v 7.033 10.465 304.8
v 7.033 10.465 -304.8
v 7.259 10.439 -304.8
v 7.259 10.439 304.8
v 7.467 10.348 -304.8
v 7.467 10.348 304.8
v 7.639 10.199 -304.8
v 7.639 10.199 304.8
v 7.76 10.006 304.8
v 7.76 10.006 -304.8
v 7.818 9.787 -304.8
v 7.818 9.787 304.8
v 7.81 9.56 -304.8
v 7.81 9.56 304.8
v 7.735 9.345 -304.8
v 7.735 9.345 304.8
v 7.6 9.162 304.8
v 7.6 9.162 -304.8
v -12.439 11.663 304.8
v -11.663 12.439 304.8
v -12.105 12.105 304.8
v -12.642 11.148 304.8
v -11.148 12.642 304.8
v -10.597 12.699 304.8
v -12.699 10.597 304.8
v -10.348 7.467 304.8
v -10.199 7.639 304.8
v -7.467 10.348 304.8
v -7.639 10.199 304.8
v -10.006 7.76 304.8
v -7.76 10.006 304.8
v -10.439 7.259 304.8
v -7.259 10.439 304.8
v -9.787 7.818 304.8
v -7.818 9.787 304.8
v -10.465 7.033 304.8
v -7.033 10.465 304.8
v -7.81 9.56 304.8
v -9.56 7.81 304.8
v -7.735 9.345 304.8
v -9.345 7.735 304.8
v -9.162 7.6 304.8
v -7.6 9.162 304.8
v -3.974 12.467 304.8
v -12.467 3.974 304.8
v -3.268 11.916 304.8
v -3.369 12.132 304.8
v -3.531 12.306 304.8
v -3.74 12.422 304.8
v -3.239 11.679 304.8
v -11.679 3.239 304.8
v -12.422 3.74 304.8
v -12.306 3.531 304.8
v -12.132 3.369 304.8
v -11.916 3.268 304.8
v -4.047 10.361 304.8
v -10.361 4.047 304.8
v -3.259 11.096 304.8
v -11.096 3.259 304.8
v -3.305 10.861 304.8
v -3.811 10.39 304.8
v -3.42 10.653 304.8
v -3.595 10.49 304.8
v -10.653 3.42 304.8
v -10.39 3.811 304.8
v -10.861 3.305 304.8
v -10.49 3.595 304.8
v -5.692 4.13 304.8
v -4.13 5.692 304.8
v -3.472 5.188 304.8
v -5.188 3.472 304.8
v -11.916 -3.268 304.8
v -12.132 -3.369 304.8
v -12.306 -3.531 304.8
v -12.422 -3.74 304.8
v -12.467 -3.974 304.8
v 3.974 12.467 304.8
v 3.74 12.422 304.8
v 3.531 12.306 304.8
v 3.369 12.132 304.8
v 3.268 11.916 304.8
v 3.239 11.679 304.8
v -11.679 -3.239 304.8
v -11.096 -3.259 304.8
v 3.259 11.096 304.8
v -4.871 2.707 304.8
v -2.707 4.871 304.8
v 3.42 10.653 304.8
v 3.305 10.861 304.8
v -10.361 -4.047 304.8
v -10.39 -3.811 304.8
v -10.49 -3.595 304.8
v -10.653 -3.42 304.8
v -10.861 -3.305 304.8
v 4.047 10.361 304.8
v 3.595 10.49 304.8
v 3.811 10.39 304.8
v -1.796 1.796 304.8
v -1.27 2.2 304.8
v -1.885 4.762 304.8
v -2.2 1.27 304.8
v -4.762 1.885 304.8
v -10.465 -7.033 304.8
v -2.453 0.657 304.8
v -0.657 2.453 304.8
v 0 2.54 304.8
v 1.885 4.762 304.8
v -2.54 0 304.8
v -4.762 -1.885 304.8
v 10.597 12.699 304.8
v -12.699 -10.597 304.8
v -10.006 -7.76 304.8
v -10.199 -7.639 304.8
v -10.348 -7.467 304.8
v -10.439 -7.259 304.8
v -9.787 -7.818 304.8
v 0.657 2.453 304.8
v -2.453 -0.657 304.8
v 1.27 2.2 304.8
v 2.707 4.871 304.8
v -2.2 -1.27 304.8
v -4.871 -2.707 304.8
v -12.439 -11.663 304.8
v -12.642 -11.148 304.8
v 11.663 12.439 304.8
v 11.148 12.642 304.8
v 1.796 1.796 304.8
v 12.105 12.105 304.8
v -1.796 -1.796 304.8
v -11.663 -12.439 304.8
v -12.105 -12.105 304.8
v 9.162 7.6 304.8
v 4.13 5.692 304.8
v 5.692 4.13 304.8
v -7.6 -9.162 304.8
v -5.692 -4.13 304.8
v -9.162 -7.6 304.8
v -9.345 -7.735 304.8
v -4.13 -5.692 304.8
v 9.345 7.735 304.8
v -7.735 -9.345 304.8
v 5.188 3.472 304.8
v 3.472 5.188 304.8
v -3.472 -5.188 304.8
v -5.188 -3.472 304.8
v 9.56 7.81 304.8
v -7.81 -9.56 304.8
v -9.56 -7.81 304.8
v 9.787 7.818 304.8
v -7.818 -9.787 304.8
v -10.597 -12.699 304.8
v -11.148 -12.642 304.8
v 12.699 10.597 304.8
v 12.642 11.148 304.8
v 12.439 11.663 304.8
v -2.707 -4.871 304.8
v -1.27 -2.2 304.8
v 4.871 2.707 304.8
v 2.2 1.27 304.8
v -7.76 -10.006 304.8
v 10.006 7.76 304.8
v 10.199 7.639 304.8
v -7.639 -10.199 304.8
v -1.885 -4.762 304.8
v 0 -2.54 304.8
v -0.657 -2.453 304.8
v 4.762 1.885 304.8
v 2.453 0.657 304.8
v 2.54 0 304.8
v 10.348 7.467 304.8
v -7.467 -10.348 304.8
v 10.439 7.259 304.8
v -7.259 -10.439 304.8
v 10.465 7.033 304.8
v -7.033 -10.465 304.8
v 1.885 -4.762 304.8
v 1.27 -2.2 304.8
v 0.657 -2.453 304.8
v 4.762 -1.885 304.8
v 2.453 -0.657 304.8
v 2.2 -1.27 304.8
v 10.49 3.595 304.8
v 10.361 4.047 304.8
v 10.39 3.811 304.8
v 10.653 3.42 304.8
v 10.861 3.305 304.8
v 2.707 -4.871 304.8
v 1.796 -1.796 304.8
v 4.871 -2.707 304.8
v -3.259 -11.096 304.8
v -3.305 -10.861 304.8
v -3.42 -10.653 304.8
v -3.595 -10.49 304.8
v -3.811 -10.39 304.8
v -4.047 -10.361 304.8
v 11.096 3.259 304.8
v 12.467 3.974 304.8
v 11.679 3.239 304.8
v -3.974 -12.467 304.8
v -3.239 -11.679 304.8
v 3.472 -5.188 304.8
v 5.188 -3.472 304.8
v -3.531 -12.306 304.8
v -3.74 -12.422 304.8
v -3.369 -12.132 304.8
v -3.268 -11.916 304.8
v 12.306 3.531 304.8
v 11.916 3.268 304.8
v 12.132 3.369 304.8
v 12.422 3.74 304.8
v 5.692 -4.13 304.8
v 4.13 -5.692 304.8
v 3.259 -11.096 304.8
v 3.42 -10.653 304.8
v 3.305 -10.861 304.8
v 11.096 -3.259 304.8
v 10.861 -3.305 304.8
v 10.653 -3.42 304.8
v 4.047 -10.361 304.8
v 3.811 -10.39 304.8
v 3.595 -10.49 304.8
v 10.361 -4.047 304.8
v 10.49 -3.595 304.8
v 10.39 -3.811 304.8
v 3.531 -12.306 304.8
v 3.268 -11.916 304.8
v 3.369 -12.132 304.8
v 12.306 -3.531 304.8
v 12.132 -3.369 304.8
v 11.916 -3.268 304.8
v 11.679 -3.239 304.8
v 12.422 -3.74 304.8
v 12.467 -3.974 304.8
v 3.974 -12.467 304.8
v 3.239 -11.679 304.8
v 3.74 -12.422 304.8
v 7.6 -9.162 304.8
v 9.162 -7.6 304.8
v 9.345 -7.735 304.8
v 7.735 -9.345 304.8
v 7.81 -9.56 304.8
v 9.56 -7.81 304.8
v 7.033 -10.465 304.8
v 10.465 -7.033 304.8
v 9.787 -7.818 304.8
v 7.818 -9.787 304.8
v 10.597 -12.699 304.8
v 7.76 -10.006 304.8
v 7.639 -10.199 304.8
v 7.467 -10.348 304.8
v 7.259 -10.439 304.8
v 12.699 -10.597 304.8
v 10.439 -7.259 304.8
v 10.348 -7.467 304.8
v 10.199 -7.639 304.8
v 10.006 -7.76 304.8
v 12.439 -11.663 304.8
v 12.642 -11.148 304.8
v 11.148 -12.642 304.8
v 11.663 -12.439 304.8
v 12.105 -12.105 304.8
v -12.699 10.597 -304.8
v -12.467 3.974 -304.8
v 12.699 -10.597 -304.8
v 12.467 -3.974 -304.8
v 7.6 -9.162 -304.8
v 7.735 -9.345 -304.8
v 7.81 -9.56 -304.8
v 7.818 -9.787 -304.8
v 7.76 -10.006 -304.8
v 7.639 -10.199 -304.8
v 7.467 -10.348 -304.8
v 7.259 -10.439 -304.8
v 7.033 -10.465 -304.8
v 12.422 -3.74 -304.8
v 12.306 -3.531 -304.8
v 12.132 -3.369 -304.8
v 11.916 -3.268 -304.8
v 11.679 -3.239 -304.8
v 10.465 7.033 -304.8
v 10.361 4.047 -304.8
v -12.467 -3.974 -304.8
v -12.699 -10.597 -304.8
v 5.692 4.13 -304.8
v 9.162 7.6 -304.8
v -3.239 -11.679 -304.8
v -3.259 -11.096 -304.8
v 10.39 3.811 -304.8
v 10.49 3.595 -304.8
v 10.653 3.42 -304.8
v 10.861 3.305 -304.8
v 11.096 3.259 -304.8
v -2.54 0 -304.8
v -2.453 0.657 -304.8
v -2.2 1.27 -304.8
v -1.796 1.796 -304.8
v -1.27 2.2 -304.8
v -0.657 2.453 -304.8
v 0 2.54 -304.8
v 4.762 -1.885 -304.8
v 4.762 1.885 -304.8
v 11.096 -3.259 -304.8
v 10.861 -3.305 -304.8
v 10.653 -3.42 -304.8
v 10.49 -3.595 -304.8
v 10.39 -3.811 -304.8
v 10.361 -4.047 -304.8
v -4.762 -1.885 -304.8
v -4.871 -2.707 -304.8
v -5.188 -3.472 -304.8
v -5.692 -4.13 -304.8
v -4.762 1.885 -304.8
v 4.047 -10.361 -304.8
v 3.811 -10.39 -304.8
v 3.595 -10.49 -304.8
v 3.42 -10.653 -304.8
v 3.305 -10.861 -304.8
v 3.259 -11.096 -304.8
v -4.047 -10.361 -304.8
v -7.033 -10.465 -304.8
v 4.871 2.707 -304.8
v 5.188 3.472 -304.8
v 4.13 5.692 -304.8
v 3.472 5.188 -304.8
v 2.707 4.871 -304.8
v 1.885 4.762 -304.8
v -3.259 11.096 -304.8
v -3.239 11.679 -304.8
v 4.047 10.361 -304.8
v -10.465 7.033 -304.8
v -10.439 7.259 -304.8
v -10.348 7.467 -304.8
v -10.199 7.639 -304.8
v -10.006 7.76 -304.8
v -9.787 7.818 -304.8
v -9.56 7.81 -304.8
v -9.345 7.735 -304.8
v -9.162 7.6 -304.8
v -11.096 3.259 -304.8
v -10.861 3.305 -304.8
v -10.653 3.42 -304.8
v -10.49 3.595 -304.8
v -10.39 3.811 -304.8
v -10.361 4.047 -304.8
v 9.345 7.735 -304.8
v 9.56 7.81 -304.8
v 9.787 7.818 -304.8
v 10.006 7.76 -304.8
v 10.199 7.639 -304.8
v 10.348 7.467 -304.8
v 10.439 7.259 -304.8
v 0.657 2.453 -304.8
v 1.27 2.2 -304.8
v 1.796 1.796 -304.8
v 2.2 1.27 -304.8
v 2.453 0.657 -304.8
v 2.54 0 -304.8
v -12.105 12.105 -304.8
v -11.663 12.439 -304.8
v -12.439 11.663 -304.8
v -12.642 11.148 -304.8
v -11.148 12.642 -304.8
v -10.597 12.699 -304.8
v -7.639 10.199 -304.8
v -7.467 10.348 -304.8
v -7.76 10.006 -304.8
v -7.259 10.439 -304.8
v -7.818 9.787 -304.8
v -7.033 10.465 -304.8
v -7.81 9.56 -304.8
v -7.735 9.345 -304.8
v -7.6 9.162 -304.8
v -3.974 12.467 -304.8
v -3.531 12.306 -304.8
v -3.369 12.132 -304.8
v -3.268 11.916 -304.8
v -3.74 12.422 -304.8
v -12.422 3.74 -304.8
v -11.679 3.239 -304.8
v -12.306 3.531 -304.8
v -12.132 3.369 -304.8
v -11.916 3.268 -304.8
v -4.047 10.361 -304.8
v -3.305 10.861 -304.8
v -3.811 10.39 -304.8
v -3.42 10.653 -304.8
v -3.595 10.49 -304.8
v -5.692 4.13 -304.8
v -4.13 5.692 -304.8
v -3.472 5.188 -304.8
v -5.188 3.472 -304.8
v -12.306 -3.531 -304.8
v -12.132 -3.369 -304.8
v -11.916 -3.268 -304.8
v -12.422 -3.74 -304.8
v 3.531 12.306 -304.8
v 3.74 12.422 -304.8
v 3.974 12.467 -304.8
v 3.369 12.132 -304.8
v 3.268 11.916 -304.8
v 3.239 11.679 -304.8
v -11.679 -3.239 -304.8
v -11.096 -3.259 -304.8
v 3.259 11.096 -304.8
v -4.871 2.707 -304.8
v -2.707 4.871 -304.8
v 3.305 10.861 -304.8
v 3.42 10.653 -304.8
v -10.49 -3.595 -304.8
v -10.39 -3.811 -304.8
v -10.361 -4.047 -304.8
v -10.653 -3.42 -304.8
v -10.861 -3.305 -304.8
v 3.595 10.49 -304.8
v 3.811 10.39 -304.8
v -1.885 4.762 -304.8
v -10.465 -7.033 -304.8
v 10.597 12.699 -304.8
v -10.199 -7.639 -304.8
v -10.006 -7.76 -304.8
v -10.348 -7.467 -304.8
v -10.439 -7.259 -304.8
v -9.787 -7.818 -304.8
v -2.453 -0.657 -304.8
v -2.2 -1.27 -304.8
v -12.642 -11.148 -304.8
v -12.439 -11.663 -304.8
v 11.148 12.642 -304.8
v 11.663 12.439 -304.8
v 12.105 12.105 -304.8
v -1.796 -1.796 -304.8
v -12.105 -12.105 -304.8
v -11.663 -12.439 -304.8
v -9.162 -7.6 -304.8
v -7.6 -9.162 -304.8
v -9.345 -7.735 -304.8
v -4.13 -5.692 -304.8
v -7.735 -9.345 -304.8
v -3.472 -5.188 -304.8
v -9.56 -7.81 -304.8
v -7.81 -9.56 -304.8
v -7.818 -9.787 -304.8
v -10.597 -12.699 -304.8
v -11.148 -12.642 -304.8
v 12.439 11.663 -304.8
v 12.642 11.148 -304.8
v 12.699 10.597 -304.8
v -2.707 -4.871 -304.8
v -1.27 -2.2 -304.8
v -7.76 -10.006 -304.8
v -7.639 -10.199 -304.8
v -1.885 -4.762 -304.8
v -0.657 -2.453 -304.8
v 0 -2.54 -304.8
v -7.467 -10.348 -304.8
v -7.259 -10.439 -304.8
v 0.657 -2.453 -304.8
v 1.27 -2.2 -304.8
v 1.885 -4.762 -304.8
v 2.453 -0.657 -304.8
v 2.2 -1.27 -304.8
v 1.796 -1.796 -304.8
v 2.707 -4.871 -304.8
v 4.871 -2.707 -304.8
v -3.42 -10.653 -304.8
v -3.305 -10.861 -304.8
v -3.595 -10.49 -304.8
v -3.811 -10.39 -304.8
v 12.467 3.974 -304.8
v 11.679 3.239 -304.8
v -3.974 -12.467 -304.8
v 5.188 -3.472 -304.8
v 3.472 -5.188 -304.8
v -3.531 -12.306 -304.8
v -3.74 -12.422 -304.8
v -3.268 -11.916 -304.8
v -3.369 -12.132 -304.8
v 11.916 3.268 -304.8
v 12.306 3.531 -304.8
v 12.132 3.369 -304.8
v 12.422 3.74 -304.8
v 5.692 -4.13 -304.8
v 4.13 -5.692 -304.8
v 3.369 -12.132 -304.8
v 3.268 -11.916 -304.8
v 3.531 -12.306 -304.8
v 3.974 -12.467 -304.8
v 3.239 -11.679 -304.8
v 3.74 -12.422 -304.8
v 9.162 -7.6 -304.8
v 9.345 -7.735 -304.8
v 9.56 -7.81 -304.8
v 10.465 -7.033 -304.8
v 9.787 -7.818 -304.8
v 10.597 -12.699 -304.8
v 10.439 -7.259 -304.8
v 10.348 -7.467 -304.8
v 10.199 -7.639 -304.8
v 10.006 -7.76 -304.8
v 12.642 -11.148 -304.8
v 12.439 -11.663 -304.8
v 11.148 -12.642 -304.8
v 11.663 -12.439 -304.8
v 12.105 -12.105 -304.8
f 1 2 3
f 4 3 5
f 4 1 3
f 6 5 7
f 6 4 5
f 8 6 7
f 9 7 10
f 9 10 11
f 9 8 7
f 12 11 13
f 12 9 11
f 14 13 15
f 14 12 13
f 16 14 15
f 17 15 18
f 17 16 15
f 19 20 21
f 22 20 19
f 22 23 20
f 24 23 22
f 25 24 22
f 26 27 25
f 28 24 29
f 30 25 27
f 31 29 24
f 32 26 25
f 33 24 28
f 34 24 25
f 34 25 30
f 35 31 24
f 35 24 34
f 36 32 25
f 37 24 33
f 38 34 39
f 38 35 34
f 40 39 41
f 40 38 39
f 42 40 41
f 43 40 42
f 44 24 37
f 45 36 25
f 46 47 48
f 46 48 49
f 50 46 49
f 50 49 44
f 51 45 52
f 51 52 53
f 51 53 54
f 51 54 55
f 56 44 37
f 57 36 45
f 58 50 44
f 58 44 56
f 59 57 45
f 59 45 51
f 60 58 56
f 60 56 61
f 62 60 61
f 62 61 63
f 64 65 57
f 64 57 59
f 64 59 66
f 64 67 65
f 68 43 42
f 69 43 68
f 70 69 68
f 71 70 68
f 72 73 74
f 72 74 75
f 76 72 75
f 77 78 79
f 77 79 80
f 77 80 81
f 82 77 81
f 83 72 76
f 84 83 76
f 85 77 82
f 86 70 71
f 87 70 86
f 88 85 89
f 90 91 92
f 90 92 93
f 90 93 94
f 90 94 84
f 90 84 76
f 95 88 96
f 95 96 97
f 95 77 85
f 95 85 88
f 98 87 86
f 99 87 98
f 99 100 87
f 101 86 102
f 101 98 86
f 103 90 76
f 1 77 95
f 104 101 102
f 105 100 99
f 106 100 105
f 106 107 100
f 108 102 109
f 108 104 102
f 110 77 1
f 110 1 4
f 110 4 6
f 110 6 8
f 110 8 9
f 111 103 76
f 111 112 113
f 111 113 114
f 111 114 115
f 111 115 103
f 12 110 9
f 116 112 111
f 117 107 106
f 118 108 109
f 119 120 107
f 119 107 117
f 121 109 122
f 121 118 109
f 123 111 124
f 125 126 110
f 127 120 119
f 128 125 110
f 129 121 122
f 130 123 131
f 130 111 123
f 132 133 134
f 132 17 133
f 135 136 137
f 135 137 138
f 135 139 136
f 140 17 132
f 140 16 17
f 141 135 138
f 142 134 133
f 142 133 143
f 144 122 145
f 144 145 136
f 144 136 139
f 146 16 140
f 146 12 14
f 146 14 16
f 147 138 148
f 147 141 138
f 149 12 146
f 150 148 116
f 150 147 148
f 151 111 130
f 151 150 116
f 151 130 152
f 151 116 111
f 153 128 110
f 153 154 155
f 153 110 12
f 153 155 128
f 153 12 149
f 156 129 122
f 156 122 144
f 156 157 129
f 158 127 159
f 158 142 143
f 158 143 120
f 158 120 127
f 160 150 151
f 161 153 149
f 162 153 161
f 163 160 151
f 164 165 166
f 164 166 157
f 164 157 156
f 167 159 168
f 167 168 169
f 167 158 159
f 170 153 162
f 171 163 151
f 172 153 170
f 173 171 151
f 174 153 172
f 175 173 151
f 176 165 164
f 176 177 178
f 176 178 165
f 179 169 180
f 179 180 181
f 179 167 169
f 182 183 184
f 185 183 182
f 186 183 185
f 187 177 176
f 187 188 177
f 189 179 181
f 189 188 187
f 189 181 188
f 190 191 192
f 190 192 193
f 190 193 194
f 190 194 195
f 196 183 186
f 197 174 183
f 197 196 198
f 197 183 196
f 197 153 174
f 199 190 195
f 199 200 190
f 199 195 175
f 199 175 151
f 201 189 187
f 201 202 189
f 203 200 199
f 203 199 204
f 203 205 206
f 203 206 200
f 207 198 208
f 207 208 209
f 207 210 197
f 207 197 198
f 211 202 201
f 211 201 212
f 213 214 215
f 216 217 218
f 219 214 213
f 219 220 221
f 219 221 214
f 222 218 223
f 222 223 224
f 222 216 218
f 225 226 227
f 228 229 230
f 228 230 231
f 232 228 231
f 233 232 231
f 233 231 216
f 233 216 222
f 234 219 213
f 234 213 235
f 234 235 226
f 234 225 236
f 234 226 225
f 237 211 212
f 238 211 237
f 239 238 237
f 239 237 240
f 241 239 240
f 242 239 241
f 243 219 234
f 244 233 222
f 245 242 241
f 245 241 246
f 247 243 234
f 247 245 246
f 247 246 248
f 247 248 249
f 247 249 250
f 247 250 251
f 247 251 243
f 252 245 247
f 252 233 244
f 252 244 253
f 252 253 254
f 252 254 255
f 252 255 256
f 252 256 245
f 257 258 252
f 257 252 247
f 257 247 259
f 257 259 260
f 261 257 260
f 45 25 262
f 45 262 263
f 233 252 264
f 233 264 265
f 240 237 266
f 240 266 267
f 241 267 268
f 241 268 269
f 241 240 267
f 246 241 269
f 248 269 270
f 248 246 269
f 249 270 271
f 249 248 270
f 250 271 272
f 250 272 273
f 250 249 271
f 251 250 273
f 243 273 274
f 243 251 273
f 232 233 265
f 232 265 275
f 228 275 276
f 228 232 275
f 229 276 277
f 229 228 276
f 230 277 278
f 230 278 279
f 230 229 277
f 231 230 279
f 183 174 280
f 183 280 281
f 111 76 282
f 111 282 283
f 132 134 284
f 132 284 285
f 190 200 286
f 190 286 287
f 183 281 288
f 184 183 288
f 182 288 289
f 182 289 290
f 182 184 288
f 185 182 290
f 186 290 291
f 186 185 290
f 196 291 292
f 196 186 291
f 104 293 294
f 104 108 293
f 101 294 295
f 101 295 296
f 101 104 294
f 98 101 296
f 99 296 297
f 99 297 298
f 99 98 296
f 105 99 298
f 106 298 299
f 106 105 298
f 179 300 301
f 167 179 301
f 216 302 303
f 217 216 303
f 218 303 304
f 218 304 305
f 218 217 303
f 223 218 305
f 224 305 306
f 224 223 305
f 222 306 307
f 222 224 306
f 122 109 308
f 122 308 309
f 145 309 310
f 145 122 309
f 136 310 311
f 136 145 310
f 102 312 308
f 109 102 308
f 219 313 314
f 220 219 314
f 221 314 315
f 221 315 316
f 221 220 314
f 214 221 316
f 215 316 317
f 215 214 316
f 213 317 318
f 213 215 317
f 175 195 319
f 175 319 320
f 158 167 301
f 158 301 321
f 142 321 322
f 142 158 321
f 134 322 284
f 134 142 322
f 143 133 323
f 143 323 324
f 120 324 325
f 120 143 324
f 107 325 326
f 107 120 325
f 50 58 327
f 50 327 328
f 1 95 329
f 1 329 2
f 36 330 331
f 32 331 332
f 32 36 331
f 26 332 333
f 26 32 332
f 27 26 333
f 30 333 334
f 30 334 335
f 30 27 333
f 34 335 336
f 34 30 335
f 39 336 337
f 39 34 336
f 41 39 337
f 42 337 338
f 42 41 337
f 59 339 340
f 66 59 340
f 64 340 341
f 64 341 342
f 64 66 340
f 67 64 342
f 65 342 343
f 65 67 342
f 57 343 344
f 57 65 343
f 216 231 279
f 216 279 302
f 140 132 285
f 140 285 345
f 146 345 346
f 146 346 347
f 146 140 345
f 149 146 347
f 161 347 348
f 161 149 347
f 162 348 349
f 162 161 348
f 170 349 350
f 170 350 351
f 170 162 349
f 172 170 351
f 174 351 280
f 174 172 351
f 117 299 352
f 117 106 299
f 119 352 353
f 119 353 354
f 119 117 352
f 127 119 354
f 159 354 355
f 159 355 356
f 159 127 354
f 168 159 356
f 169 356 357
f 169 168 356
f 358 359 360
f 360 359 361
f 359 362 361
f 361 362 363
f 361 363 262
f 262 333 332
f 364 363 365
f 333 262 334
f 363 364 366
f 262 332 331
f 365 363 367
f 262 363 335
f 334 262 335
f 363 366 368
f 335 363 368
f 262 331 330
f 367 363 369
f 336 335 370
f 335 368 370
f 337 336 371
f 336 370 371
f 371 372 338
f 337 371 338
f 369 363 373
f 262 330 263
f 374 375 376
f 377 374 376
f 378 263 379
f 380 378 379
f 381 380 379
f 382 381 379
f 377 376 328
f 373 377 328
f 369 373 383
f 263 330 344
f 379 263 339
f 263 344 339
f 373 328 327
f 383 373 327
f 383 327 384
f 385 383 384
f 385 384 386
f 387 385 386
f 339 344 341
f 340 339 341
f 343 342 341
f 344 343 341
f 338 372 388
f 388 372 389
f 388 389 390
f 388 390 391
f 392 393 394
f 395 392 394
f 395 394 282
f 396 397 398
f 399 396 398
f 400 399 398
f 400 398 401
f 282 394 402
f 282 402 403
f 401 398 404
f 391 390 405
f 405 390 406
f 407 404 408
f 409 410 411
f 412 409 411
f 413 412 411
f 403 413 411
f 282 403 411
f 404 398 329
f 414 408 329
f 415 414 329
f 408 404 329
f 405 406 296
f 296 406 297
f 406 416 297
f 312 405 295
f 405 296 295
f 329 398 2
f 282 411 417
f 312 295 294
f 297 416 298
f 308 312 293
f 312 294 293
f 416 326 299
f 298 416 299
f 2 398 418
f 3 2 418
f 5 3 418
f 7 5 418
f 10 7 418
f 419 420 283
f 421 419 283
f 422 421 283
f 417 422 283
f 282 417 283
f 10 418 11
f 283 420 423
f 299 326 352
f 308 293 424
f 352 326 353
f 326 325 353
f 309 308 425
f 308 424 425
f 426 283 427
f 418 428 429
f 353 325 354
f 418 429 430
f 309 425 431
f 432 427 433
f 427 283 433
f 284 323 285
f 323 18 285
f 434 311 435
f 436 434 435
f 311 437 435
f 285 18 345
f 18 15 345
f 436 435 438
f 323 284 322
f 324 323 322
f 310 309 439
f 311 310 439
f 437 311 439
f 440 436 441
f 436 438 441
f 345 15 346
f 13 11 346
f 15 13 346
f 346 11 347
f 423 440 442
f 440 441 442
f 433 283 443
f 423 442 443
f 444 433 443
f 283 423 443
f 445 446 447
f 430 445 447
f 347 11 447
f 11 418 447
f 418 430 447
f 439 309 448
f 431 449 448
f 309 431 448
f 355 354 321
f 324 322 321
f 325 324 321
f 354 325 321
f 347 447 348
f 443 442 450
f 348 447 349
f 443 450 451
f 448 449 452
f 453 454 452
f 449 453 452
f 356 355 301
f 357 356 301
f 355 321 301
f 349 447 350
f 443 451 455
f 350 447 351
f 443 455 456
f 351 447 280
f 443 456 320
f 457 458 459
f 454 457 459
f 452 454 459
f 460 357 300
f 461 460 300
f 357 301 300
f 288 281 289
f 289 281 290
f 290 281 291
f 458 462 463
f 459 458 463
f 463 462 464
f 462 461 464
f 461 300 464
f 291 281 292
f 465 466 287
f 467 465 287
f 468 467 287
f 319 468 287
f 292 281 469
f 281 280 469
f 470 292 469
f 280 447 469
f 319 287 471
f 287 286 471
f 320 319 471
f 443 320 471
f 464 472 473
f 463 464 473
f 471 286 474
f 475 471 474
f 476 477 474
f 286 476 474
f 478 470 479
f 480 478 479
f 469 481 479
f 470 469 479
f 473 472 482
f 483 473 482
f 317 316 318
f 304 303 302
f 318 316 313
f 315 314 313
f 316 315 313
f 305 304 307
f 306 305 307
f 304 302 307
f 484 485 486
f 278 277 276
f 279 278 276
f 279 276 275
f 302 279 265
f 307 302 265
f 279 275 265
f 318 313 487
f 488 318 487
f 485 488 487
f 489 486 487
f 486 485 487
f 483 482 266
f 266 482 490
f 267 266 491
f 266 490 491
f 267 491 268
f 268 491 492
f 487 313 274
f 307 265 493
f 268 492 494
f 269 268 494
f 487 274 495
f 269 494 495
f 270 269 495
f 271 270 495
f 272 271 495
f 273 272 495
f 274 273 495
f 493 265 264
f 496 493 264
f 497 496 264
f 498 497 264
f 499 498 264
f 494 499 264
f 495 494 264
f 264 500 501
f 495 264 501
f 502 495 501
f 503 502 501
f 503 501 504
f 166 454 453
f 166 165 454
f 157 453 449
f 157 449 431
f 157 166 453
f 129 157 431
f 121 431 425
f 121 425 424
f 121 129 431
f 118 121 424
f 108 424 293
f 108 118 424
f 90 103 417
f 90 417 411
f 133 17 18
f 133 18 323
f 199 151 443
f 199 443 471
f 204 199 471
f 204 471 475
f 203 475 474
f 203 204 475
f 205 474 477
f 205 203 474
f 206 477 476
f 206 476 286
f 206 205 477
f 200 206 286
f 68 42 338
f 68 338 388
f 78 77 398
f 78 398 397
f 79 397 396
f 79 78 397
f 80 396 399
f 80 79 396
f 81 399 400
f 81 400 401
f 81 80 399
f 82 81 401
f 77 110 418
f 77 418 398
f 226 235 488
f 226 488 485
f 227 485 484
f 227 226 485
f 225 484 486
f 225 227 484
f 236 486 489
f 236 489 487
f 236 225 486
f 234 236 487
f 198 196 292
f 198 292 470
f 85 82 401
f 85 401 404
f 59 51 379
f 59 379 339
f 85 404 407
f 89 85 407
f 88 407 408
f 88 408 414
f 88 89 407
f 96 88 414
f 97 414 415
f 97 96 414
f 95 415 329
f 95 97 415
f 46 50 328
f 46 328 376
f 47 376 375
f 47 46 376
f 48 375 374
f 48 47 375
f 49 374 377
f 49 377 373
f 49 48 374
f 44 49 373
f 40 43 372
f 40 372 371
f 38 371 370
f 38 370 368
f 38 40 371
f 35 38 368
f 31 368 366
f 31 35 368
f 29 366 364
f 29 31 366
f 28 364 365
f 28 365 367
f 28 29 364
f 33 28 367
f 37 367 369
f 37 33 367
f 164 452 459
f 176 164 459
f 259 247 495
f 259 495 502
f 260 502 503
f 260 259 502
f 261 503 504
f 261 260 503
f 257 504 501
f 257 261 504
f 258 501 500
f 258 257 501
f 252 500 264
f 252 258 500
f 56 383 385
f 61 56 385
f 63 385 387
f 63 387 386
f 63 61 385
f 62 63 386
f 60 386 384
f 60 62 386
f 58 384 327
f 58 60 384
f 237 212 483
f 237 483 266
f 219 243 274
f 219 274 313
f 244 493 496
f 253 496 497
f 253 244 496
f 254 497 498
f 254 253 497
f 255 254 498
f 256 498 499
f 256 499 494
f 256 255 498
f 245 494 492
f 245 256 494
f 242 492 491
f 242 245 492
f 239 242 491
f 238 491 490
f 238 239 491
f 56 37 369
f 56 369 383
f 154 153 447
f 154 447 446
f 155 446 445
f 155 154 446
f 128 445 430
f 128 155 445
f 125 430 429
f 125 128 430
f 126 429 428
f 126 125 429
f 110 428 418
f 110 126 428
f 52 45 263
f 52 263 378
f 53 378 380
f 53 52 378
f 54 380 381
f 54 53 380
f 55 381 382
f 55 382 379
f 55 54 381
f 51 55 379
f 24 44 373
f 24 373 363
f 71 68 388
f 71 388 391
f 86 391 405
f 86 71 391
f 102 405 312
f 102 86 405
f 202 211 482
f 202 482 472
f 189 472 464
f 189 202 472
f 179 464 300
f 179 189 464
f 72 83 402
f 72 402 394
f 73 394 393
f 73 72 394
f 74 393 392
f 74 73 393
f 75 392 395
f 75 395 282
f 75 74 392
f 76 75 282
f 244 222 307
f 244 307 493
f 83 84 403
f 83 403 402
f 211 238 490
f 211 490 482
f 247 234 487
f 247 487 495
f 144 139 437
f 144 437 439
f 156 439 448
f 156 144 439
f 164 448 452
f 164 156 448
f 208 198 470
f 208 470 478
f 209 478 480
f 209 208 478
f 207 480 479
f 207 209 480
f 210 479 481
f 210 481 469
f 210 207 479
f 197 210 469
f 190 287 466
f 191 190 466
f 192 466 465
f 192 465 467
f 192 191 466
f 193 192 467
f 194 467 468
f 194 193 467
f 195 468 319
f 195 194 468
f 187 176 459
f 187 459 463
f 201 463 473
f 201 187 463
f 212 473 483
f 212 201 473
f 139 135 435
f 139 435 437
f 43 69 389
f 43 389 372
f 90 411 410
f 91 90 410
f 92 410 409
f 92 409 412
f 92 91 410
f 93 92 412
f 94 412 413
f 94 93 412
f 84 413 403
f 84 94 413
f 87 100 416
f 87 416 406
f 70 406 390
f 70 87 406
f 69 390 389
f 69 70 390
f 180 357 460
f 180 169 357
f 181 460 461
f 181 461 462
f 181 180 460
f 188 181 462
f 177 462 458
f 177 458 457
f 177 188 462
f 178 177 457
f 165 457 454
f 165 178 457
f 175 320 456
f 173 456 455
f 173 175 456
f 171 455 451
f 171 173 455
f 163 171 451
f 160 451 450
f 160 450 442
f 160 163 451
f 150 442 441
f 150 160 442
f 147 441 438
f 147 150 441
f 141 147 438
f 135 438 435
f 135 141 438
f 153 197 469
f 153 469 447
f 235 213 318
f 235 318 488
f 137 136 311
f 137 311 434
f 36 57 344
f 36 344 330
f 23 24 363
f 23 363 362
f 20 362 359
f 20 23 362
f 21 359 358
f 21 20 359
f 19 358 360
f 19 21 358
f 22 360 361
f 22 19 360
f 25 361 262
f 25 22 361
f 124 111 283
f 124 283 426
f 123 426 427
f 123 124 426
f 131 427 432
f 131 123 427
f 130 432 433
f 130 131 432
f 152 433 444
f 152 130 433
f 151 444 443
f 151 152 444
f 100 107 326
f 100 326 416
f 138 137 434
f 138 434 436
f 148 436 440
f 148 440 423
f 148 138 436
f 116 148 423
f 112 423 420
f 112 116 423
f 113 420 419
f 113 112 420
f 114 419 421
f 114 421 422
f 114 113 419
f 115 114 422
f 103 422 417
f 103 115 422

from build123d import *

# Parameters (mm, degrees)
BOSS_EXTRUDE1_DEPTH = 304.8
CIRPATTERN1_COUNT   = 4


with BuildPart() as part:
    # Sketch3 → Boss-Extrude1 (new, symmetric)
    with BuildSketch(Plane.XY):
        with BuildLine():
            Line((0, 4.7625), (-1.884807374, 4.7625))
            ThreePointArc((-1.884807374, 4.7625), (-3.099827272, 5.004182484), (-4.129871405, 5.69243597))
            Line((-4.129871405, 5.69243597), (-7.599623114, 9.162187679))
            ThreePointArc((-7.599623114, 9.162187679), (-7.759888701, 10.006330839), (-7.033220609, 10.464824259))
            Line((-7.033220609, 10.464824259), (-4.047481702, 10.360559959))
            ThreePointArc((-4.047481702, 10.360559959), (-3.501205536, 10.564804249), (-3.259352476, 11.095502353))
            Line((-3.259352476, 11.095502353), (-3.23896419, 11.679346474))
            ThreePointArc((-3.23896419, 11.679346474), (-3.443208479, 12.225622641), (-3.973906584, 12.467475701))
            Line((-3.973906584, 12.467475701), (-10.597084223, 12.698762161))
            ThreePointArc((-10.597084223, 12.698762161), (-12.104840979, 12.104840979), (-12.698762161, 10.597084223))
            Line((-12.698762161, 10.597084223), (-12.467475701, 3.973906584))
            ThreePointArc((-12.467475701, 3.973906584), (-12.225622641, 3.443208479), (-11.679346474, 3.23896419))
            Line((-11.679346474, 3.23896419), (-11.095502353, 3.259352476))
            ThreePointArc((-11.095502353, 3.259352476), (-10.564804249, 3.501205536), (-10.360559959, 4.047481702))
            Line((-10.360559959, 4.047481702), (-10.464824259, 7.033220609))
            ThreePointArc((-10.464824259, 7.033220609), (-10.006330839, 7.759888701), (-9.162187679, 7.599623114))
            Line((-9.162187679, 7.599623114), (-5.69243597, 4.129871405))
            ThreePointArc((-5.69243597, 4.129871405), (-5.004182484, 3.099827272), (-4.7625, 1.884807374))
            Line((-4.7625, 1.884807374), (-4.7625, 0))
            Line((-4.7625, 0), (-2.54, 0))
            ThreePointArc((-2.54, 0), (-1.796051224, 1.796051224), (0, 2.54))
            Line((0, 2.54), (0, 4.7625))
        make_face()
    boss_extrude1 = extrude(amount=BOSS_EXTRUDE1_DEPTH, both=True)

    # CirPattern1: Boss-Extrude1 ×4 about axis
    cirpattern1_axis = Axis((0, 0, 0), (0, 0, 1))
    for i in range(1, CIRPATTERN1_COUNT):
        add(boss_extrude1.rotate(cirpattern1_axis, i * 360 / CIRPATTERN1_COUNT))


solid = part.part
